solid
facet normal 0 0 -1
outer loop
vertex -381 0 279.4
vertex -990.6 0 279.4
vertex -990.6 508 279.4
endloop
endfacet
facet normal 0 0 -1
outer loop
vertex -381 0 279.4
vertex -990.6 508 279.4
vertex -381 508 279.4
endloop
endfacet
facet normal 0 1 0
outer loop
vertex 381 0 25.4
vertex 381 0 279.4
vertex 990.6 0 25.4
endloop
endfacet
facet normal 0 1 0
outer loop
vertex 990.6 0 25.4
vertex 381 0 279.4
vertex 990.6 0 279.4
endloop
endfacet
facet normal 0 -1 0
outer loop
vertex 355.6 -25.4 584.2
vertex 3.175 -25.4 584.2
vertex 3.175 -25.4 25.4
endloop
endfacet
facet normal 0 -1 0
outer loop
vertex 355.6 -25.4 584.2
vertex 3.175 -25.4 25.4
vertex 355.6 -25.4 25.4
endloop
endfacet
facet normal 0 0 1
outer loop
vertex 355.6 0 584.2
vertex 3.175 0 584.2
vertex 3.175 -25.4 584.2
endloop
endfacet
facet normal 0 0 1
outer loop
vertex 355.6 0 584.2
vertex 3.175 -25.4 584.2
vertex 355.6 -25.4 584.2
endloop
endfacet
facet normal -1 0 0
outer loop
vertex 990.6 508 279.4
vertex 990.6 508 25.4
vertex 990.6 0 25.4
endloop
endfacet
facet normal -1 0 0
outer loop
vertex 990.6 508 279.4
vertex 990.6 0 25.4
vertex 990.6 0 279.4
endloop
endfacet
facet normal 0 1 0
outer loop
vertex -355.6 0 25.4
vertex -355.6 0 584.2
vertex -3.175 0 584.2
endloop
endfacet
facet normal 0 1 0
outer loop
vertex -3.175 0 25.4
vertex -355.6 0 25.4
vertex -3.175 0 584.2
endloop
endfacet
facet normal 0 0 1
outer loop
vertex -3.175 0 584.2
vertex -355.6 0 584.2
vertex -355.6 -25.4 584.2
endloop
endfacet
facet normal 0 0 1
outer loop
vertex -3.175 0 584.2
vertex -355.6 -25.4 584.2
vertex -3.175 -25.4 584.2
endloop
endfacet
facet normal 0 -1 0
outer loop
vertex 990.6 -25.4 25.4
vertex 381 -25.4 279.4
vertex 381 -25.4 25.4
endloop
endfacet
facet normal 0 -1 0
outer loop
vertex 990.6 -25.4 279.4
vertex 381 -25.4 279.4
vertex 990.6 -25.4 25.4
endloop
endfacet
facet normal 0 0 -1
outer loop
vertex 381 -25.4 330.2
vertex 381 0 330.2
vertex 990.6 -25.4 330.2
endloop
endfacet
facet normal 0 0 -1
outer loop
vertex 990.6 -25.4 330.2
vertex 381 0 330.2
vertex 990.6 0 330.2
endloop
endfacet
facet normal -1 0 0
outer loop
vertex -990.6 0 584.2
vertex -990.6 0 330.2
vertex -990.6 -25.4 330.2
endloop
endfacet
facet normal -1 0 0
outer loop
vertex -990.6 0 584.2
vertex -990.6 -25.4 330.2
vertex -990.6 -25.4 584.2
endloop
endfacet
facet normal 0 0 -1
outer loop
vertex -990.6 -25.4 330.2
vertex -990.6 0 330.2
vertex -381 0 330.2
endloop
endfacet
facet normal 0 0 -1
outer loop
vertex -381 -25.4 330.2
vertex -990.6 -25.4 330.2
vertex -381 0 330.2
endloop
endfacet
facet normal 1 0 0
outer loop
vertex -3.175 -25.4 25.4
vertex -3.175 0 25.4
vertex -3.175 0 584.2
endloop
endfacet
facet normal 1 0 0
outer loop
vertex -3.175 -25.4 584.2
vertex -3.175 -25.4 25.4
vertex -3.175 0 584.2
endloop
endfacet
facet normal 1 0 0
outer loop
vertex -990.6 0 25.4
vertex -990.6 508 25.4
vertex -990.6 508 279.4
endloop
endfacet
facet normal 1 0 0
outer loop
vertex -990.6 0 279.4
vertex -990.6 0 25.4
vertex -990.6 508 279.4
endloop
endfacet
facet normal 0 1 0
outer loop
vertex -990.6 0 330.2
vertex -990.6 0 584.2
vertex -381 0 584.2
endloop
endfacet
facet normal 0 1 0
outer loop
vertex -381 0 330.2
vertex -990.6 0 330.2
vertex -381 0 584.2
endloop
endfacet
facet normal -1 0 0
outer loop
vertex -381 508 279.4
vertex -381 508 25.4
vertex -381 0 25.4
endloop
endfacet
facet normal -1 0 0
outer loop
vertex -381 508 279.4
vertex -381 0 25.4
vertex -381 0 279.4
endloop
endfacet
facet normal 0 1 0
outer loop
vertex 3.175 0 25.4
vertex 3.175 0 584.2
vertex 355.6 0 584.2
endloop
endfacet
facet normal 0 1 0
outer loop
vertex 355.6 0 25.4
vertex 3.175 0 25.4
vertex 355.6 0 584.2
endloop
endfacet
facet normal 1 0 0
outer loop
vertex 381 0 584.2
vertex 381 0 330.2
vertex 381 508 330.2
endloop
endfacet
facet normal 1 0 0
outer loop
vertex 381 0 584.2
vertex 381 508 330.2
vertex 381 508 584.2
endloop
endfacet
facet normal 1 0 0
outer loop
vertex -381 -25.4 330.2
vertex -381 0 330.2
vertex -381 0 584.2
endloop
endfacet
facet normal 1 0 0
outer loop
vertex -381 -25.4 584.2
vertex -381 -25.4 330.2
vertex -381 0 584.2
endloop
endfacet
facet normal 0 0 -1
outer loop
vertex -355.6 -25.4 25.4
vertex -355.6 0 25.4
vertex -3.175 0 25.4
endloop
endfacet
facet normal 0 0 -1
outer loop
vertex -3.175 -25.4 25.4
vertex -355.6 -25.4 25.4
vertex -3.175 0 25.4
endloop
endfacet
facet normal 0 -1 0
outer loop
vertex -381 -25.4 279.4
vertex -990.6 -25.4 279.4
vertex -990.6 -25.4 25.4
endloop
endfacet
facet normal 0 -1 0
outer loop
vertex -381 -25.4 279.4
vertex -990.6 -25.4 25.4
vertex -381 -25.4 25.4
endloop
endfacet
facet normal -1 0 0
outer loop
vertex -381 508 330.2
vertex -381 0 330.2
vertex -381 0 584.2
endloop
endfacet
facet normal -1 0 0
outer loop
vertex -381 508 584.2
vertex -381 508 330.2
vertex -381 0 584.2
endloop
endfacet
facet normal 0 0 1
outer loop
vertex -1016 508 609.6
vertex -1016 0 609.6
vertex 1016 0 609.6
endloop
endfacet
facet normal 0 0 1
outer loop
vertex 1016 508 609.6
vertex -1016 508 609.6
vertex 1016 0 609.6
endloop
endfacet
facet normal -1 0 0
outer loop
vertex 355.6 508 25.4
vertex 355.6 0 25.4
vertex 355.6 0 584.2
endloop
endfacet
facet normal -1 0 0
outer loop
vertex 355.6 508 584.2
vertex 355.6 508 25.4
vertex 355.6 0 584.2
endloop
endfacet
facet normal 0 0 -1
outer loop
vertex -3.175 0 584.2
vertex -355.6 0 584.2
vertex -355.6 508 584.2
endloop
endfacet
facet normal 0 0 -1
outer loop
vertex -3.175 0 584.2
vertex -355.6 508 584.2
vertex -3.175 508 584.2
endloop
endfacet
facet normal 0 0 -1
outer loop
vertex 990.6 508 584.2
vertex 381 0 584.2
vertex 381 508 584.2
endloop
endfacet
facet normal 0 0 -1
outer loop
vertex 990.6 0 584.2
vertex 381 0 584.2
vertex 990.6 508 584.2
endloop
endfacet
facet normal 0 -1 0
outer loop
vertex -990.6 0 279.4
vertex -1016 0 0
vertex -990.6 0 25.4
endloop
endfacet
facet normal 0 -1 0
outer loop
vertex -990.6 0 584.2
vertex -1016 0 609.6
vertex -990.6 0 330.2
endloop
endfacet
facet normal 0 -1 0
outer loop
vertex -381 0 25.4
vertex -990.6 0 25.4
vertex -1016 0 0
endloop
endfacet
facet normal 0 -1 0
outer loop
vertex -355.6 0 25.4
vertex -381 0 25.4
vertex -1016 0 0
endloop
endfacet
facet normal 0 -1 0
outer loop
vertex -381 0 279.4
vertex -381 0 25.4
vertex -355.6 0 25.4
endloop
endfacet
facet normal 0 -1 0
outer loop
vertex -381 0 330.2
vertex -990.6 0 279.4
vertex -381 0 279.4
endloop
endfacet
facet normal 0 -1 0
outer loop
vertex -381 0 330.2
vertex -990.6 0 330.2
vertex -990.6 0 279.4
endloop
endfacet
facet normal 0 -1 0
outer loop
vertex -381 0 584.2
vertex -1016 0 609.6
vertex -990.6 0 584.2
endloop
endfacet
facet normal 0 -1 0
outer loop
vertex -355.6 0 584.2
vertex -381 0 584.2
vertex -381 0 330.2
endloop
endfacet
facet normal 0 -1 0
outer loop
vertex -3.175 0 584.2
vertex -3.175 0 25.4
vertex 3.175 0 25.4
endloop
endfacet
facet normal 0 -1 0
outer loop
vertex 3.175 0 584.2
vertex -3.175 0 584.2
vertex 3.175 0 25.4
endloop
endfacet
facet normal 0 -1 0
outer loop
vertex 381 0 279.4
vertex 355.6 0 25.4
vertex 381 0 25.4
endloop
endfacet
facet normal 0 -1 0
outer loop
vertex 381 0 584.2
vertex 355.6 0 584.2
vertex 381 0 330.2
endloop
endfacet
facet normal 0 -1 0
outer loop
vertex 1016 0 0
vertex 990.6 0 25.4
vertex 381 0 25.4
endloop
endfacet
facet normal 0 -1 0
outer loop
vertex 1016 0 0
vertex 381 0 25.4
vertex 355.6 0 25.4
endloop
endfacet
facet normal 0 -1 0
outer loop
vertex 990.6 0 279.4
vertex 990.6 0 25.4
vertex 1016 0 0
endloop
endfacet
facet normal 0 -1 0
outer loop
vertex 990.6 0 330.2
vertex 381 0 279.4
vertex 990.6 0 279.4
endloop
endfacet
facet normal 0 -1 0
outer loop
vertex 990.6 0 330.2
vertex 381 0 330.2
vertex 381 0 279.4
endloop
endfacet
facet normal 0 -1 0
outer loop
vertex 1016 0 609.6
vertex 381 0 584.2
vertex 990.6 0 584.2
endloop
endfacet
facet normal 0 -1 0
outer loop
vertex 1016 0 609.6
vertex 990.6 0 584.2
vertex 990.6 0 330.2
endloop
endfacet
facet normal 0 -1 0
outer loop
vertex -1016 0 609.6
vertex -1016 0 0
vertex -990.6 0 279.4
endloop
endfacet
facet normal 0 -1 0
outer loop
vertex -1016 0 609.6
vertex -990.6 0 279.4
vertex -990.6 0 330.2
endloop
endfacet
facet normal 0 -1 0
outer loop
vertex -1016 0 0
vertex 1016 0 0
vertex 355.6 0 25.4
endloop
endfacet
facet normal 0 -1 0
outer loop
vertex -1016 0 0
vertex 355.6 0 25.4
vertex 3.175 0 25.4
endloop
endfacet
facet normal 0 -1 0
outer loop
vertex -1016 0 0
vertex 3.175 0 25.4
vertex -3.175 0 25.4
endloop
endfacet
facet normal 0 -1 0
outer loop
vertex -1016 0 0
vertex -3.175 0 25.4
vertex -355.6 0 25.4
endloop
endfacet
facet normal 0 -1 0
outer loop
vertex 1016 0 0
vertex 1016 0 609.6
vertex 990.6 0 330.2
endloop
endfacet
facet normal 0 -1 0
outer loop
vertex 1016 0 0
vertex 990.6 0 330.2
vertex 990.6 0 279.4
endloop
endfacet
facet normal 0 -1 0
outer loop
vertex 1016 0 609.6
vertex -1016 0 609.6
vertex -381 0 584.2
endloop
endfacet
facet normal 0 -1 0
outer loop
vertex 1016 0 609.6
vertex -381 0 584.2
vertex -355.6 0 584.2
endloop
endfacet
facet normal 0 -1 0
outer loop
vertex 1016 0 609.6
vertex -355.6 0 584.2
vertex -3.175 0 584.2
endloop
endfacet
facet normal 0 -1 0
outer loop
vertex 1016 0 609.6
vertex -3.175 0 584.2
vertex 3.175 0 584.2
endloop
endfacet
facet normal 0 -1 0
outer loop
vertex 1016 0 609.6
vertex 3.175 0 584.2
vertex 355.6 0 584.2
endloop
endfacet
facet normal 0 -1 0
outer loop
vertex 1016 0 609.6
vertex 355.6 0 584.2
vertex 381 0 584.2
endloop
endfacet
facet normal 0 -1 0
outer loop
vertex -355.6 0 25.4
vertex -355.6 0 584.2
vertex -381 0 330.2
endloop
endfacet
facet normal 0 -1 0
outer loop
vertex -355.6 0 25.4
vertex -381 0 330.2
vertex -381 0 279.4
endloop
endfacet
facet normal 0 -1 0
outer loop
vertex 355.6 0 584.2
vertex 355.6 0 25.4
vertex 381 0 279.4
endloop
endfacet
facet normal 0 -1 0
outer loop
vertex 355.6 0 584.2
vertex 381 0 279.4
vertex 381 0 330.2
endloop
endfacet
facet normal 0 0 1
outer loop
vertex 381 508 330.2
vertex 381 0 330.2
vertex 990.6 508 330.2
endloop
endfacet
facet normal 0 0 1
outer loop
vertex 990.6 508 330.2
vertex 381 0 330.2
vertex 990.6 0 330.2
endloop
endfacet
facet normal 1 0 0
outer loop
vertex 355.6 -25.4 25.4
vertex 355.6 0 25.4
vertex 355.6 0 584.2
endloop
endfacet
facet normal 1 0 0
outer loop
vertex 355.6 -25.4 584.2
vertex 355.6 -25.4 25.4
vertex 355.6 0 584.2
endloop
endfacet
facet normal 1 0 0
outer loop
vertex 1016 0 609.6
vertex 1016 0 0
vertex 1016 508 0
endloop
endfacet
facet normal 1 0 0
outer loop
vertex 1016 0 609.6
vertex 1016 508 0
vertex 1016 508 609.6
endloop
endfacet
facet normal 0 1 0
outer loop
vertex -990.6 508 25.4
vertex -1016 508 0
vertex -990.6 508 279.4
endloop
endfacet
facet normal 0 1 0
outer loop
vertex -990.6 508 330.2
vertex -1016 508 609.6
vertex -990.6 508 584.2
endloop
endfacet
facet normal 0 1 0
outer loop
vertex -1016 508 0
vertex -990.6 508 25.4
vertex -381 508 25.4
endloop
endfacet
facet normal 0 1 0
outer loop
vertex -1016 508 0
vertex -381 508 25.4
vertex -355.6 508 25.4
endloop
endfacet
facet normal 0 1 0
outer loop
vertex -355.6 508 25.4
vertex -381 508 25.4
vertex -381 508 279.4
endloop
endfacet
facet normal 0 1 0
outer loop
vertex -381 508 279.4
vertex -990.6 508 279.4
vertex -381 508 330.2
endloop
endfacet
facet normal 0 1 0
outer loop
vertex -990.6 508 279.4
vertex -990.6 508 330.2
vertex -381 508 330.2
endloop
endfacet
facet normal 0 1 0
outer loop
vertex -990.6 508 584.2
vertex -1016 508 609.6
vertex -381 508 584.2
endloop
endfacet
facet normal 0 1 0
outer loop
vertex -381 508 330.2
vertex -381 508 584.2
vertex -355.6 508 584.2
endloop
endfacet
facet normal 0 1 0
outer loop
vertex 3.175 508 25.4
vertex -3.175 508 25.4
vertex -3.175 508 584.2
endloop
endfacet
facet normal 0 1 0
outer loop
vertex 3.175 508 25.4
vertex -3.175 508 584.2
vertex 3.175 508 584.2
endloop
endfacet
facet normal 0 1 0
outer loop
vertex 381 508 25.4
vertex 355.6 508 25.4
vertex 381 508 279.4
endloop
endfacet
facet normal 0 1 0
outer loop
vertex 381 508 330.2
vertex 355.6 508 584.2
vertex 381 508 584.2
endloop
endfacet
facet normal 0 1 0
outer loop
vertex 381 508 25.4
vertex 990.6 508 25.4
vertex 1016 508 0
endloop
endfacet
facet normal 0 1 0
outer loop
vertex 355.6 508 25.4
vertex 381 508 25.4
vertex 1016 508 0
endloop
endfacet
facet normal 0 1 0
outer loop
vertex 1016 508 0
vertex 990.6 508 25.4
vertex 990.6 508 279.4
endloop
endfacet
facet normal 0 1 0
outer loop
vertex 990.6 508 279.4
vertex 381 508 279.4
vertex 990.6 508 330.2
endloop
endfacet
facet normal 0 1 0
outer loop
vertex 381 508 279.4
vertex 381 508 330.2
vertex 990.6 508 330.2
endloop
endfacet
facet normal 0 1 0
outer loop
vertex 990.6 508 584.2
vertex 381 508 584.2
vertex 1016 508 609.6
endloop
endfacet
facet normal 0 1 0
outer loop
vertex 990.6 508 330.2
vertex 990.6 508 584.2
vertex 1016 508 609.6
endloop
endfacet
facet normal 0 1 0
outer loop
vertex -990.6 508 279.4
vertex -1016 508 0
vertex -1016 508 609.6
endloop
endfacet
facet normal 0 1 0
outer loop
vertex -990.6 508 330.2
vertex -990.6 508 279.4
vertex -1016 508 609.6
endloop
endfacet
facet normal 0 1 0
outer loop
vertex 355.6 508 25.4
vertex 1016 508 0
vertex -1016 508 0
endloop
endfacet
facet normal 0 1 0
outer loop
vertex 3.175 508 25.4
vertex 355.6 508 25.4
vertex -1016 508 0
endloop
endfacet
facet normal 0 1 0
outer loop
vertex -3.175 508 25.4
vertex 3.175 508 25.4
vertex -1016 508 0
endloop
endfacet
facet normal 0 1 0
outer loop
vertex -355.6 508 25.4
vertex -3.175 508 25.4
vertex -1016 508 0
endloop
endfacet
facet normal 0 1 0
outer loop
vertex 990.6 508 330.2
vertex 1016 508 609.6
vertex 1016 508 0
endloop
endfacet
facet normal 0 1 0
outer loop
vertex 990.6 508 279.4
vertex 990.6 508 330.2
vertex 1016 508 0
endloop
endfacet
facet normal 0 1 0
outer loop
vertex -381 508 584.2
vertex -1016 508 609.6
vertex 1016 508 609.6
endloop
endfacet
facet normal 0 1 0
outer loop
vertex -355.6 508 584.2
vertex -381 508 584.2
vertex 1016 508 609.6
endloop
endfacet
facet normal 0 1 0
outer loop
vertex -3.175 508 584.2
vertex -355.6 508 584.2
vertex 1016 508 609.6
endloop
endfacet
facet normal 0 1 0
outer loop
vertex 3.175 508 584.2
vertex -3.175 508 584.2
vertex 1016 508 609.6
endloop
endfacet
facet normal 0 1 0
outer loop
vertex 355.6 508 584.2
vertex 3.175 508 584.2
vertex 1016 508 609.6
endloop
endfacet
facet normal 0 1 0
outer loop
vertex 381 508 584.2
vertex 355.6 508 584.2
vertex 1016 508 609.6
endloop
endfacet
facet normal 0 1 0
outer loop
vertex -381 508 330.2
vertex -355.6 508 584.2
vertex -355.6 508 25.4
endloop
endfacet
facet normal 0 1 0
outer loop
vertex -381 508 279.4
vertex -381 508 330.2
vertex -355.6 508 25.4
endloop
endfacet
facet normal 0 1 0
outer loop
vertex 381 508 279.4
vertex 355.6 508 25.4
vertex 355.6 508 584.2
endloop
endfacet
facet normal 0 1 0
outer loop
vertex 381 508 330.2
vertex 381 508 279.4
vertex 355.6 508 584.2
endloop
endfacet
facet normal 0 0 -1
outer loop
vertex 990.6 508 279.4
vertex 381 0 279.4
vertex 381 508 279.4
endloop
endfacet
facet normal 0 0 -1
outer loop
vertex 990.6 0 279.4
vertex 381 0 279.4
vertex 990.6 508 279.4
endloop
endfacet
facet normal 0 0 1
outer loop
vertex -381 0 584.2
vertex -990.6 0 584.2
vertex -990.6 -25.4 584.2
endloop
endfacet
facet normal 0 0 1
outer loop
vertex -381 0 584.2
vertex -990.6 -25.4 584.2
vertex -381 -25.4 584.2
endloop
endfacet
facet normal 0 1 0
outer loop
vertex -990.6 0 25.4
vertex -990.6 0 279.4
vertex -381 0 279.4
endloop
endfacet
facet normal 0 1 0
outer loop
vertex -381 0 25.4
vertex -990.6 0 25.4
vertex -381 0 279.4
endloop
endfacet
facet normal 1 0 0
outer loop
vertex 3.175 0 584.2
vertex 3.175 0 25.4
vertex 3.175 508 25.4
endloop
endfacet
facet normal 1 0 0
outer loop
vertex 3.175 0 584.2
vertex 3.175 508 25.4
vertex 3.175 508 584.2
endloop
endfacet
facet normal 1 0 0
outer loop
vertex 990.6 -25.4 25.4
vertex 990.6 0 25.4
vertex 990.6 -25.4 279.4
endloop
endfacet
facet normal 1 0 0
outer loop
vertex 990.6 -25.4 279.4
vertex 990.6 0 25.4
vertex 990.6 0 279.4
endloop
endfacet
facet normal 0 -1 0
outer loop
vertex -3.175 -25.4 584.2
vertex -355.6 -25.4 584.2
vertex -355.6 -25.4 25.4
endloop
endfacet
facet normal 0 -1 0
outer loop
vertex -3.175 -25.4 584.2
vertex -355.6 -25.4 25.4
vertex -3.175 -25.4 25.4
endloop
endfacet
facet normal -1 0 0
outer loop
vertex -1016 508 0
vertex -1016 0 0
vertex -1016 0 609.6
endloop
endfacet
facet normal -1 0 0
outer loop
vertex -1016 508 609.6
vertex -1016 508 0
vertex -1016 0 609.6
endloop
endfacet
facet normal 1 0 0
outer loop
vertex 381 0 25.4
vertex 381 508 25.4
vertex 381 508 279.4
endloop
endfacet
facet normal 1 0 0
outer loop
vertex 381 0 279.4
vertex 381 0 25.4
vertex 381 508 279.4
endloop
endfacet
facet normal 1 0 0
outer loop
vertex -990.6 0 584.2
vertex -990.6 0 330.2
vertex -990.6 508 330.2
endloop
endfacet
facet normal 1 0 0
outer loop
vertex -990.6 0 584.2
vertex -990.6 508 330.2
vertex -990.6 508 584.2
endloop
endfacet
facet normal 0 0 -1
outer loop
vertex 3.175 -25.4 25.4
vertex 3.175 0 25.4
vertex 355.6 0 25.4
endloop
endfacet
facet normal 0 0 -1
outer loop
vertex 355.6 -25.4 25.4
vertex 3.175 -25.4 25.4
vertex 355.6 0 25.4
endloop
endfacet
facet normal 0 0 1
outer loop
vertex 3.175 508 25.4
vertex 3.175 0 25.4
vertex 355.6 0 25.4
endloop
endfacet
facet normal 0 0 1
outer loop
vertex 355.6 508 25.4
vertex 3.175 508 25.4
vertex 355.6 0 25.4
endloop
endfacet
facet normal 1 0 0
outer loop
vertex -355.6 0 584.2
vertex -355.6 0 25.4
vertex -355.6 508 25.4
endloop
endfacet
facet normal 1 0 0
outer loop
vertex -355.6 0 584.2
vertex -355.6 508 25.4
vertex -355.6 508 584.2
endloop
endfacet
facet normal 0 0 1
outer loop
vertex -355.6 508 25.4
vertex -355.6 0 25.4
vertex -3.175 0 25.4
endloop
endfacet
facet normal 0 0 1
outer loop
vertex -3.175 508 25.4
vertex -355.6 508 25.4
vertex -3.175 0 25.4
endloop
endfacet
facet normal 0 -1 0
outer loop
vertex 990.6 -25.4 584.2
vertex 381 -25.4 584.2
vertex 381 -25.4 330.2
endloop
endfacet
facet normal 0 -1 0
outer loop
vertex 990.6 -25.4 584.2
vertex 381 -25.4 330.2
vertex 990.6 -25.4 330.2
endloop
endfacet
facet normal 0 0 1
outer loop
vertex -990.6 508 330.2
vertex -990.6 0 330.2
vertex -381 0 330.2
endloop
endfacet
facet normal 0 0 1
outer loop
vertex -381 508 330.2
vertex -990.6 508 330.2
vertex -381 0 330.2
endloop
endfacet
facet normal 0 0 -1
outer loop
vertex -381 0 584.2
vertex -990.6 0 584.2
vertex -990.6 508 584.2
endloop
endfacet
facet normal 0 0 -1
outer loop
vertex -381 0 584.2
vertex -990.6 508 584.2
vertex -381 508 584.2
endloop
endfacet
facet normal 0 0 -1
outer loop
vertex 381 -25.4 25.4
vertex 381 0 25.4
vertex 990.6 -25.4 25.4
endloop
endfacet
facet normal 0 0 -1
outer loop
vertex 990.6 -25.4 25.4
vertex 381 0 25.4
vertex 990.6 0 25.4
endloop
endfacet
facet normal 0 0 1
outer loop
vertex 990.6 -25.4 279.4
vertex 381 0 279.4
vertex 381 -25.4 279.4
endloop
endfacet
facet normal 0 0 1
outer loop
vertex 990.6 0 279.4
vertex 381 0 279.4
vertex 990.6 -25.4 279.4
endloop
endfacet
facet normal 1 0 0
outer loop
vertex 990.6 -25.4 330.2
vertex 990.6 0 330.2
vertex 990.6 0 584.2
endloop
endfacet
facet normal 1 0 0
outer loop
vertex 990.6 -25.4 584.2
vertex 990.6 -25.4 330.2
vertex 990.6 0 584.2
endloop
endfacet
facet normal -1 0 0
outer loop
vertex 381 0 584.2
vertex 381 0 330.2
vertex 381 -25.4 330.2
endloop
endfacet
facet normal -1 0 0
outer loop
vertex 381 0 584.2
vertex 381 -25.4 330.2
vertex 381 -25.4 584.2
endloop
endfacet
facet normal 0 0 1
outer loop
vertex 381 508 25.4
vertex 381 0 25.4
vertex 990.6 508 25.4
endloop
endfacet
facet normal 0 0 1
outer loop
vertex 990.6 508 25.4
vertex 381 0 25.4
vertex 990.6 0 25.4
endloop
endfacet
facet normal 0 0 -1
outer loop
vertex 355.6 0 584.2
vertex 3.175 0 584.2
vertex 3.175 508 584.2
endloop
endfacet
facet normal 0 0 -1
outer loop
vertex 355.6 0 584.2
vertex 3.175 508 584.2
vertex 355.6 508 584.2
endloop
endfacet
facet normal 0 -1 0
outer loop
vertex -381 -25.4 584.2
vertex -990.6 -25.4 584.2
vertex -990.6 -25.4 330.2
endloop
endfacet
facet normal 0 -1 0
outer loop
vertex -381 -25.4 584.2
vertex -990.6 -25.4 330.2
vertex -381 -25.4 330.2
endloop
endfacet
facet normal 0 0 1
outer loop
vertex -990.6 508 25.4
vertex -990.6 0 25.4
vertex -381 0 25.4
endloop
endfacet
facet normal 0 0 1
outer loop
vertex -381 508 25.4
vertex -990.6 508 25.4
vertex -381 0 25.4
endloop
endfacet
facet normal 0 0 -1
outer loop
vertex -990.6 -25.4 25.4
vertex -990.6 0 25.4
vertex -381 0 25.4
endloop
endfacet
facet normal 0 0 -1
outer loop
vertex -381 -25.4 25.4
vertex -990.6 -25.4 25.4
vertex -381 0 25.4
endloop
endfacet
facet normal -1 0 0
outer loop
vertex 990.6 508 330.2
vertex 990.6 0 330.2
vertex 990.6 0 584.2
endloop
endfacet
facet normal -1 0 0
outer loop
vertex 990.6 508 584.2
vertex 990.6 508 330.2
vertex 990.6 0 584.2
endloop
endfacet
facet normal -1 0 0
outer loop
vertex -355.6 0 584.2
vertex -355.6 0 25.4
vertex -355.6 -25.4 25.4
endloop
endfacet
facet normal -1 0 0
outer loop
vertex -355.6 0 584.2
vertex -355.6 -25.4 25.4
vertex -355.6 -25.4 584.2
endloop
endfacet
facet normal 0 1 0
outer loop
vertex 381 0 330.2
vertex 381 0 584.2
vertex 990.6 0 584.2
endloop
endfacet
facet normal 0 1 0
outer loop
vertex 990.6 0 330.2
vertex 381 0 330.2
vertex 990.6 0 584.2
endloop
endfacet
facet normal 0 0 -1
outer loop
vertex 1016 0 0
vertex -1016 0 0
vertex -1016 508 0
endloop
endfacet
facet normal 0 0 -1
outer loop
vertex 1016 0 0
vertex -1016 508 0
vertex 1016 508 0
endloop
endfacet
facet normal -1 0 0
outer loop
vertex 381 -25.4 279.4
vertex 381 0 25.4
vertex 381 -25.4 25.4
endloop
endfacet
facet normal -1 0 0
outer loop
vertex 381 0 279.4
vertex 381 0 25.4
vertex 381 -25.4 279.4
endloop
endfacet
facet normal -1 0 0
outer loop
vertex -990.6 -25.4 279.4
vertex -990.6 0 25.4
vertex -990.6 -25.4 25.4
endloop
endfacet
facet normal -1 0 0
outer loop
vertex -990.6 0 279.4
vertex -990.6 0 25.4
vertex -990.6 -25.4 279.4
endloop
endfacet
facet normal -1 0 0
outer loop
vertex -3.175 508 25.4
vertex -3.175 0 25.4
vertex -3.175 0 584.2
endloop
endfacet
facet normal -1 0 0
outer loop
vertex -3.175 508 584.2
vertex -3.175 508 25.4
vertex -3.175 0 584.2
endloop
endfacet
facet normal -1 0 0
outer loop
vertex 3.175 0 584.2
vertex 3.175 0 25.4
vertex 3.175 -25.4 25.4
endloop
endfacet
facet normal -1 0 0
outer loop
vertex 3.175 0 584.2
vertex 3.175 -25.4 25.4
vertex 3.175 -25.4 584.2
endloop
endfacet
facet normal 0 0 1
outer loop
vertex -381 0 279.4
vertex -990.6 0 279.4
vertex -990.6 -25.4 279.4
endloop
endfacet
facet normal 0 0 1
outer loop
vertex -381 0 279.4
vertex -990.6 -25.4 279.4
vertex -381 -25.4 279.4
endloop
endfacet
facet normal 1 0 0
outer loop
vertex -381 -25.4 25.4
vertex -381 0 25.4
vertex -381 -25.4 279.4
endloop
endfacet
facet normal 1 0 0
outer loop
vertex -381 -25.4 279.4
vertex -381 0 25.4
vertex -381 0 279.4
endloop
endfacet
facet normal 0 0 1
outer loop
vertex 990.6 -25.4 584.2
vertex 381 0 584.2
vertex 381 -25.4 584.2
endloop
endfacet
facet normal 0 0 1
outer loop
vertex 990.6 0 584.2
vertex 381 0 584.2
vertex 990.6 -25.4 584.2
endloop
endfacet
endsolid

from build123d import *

# Parameters (mm, degrees)
F0_W     = 609.6
F0_H     = 254
F0_W_2   = 352.425
F0_H_2   = 558.8
F1_DEPTH = 25.4
F0_W_3   = 2032
F0_H_3   = 609.6
F2_DEPTH = 508


with BuildPart() as f1:
    # F0 (on Front) → F1 (new body)
    with BuildSketch(Plane.XZ):
        with Locations((-685.8, 457.2)):
            Rectangle(F0_W, F0_H)
        with Locations((-685.8, 152.4)):
            Rectangle(F0_W, F0_H)
        with Locations((685.8, 457.2)):
            Rectangle(F0_W, F0_H)
        with Locations((685.8, 152.4)):
            Rectangle(F0_W, F0_H)
        with Locations((179.3875, 304.8)):
            Rectangle(F0_W_2, F0_H_2)
        with Locations((-179.3875, 304.8)):
            Rectangle(F0_W_2, F0_H_2)
    extrude(amount=F1_DEPTH)


with BuildPart() as f2:
    # F0 (on Front) → F2 (new body)
    with BuildSketch(Plane.XZ):
        with Locations((0, 304.8)):
            Rectangle(F0_W_3, F0_H_3)
        with Locations((-685.8, 152.4)):
            Rectangle(F0_W, F0_H, mode=Mode.SUBTRACT)
        with Locations((685.8, 152.4)):
            Rectangle(F0_W, F0_H, mode=Mode.SUBTRACT)
        with Locations((-179.3875, 304.8)):
            Rectangle(F0_W_2, F0_H_2, mode=Mode.SUBTRACT)
        with Locations((-685.8, 457.2)):
            Rectangle(F0_W, F0_H, mode=Mode.SUBTRACT)
        with Locations((179.3875, 304.8)):
            Rectangle(F0_W_2, F0_H_2, mode=Mode.SUBTRACT)
        with Locations((685.8, 457.2)):
            Rectangle(F0_W, F0_H, mode=Mode.SUBTRACT)
    extrude(amount=-F2_DEPTH)


solid = Compound([f1.part, f2.part])
